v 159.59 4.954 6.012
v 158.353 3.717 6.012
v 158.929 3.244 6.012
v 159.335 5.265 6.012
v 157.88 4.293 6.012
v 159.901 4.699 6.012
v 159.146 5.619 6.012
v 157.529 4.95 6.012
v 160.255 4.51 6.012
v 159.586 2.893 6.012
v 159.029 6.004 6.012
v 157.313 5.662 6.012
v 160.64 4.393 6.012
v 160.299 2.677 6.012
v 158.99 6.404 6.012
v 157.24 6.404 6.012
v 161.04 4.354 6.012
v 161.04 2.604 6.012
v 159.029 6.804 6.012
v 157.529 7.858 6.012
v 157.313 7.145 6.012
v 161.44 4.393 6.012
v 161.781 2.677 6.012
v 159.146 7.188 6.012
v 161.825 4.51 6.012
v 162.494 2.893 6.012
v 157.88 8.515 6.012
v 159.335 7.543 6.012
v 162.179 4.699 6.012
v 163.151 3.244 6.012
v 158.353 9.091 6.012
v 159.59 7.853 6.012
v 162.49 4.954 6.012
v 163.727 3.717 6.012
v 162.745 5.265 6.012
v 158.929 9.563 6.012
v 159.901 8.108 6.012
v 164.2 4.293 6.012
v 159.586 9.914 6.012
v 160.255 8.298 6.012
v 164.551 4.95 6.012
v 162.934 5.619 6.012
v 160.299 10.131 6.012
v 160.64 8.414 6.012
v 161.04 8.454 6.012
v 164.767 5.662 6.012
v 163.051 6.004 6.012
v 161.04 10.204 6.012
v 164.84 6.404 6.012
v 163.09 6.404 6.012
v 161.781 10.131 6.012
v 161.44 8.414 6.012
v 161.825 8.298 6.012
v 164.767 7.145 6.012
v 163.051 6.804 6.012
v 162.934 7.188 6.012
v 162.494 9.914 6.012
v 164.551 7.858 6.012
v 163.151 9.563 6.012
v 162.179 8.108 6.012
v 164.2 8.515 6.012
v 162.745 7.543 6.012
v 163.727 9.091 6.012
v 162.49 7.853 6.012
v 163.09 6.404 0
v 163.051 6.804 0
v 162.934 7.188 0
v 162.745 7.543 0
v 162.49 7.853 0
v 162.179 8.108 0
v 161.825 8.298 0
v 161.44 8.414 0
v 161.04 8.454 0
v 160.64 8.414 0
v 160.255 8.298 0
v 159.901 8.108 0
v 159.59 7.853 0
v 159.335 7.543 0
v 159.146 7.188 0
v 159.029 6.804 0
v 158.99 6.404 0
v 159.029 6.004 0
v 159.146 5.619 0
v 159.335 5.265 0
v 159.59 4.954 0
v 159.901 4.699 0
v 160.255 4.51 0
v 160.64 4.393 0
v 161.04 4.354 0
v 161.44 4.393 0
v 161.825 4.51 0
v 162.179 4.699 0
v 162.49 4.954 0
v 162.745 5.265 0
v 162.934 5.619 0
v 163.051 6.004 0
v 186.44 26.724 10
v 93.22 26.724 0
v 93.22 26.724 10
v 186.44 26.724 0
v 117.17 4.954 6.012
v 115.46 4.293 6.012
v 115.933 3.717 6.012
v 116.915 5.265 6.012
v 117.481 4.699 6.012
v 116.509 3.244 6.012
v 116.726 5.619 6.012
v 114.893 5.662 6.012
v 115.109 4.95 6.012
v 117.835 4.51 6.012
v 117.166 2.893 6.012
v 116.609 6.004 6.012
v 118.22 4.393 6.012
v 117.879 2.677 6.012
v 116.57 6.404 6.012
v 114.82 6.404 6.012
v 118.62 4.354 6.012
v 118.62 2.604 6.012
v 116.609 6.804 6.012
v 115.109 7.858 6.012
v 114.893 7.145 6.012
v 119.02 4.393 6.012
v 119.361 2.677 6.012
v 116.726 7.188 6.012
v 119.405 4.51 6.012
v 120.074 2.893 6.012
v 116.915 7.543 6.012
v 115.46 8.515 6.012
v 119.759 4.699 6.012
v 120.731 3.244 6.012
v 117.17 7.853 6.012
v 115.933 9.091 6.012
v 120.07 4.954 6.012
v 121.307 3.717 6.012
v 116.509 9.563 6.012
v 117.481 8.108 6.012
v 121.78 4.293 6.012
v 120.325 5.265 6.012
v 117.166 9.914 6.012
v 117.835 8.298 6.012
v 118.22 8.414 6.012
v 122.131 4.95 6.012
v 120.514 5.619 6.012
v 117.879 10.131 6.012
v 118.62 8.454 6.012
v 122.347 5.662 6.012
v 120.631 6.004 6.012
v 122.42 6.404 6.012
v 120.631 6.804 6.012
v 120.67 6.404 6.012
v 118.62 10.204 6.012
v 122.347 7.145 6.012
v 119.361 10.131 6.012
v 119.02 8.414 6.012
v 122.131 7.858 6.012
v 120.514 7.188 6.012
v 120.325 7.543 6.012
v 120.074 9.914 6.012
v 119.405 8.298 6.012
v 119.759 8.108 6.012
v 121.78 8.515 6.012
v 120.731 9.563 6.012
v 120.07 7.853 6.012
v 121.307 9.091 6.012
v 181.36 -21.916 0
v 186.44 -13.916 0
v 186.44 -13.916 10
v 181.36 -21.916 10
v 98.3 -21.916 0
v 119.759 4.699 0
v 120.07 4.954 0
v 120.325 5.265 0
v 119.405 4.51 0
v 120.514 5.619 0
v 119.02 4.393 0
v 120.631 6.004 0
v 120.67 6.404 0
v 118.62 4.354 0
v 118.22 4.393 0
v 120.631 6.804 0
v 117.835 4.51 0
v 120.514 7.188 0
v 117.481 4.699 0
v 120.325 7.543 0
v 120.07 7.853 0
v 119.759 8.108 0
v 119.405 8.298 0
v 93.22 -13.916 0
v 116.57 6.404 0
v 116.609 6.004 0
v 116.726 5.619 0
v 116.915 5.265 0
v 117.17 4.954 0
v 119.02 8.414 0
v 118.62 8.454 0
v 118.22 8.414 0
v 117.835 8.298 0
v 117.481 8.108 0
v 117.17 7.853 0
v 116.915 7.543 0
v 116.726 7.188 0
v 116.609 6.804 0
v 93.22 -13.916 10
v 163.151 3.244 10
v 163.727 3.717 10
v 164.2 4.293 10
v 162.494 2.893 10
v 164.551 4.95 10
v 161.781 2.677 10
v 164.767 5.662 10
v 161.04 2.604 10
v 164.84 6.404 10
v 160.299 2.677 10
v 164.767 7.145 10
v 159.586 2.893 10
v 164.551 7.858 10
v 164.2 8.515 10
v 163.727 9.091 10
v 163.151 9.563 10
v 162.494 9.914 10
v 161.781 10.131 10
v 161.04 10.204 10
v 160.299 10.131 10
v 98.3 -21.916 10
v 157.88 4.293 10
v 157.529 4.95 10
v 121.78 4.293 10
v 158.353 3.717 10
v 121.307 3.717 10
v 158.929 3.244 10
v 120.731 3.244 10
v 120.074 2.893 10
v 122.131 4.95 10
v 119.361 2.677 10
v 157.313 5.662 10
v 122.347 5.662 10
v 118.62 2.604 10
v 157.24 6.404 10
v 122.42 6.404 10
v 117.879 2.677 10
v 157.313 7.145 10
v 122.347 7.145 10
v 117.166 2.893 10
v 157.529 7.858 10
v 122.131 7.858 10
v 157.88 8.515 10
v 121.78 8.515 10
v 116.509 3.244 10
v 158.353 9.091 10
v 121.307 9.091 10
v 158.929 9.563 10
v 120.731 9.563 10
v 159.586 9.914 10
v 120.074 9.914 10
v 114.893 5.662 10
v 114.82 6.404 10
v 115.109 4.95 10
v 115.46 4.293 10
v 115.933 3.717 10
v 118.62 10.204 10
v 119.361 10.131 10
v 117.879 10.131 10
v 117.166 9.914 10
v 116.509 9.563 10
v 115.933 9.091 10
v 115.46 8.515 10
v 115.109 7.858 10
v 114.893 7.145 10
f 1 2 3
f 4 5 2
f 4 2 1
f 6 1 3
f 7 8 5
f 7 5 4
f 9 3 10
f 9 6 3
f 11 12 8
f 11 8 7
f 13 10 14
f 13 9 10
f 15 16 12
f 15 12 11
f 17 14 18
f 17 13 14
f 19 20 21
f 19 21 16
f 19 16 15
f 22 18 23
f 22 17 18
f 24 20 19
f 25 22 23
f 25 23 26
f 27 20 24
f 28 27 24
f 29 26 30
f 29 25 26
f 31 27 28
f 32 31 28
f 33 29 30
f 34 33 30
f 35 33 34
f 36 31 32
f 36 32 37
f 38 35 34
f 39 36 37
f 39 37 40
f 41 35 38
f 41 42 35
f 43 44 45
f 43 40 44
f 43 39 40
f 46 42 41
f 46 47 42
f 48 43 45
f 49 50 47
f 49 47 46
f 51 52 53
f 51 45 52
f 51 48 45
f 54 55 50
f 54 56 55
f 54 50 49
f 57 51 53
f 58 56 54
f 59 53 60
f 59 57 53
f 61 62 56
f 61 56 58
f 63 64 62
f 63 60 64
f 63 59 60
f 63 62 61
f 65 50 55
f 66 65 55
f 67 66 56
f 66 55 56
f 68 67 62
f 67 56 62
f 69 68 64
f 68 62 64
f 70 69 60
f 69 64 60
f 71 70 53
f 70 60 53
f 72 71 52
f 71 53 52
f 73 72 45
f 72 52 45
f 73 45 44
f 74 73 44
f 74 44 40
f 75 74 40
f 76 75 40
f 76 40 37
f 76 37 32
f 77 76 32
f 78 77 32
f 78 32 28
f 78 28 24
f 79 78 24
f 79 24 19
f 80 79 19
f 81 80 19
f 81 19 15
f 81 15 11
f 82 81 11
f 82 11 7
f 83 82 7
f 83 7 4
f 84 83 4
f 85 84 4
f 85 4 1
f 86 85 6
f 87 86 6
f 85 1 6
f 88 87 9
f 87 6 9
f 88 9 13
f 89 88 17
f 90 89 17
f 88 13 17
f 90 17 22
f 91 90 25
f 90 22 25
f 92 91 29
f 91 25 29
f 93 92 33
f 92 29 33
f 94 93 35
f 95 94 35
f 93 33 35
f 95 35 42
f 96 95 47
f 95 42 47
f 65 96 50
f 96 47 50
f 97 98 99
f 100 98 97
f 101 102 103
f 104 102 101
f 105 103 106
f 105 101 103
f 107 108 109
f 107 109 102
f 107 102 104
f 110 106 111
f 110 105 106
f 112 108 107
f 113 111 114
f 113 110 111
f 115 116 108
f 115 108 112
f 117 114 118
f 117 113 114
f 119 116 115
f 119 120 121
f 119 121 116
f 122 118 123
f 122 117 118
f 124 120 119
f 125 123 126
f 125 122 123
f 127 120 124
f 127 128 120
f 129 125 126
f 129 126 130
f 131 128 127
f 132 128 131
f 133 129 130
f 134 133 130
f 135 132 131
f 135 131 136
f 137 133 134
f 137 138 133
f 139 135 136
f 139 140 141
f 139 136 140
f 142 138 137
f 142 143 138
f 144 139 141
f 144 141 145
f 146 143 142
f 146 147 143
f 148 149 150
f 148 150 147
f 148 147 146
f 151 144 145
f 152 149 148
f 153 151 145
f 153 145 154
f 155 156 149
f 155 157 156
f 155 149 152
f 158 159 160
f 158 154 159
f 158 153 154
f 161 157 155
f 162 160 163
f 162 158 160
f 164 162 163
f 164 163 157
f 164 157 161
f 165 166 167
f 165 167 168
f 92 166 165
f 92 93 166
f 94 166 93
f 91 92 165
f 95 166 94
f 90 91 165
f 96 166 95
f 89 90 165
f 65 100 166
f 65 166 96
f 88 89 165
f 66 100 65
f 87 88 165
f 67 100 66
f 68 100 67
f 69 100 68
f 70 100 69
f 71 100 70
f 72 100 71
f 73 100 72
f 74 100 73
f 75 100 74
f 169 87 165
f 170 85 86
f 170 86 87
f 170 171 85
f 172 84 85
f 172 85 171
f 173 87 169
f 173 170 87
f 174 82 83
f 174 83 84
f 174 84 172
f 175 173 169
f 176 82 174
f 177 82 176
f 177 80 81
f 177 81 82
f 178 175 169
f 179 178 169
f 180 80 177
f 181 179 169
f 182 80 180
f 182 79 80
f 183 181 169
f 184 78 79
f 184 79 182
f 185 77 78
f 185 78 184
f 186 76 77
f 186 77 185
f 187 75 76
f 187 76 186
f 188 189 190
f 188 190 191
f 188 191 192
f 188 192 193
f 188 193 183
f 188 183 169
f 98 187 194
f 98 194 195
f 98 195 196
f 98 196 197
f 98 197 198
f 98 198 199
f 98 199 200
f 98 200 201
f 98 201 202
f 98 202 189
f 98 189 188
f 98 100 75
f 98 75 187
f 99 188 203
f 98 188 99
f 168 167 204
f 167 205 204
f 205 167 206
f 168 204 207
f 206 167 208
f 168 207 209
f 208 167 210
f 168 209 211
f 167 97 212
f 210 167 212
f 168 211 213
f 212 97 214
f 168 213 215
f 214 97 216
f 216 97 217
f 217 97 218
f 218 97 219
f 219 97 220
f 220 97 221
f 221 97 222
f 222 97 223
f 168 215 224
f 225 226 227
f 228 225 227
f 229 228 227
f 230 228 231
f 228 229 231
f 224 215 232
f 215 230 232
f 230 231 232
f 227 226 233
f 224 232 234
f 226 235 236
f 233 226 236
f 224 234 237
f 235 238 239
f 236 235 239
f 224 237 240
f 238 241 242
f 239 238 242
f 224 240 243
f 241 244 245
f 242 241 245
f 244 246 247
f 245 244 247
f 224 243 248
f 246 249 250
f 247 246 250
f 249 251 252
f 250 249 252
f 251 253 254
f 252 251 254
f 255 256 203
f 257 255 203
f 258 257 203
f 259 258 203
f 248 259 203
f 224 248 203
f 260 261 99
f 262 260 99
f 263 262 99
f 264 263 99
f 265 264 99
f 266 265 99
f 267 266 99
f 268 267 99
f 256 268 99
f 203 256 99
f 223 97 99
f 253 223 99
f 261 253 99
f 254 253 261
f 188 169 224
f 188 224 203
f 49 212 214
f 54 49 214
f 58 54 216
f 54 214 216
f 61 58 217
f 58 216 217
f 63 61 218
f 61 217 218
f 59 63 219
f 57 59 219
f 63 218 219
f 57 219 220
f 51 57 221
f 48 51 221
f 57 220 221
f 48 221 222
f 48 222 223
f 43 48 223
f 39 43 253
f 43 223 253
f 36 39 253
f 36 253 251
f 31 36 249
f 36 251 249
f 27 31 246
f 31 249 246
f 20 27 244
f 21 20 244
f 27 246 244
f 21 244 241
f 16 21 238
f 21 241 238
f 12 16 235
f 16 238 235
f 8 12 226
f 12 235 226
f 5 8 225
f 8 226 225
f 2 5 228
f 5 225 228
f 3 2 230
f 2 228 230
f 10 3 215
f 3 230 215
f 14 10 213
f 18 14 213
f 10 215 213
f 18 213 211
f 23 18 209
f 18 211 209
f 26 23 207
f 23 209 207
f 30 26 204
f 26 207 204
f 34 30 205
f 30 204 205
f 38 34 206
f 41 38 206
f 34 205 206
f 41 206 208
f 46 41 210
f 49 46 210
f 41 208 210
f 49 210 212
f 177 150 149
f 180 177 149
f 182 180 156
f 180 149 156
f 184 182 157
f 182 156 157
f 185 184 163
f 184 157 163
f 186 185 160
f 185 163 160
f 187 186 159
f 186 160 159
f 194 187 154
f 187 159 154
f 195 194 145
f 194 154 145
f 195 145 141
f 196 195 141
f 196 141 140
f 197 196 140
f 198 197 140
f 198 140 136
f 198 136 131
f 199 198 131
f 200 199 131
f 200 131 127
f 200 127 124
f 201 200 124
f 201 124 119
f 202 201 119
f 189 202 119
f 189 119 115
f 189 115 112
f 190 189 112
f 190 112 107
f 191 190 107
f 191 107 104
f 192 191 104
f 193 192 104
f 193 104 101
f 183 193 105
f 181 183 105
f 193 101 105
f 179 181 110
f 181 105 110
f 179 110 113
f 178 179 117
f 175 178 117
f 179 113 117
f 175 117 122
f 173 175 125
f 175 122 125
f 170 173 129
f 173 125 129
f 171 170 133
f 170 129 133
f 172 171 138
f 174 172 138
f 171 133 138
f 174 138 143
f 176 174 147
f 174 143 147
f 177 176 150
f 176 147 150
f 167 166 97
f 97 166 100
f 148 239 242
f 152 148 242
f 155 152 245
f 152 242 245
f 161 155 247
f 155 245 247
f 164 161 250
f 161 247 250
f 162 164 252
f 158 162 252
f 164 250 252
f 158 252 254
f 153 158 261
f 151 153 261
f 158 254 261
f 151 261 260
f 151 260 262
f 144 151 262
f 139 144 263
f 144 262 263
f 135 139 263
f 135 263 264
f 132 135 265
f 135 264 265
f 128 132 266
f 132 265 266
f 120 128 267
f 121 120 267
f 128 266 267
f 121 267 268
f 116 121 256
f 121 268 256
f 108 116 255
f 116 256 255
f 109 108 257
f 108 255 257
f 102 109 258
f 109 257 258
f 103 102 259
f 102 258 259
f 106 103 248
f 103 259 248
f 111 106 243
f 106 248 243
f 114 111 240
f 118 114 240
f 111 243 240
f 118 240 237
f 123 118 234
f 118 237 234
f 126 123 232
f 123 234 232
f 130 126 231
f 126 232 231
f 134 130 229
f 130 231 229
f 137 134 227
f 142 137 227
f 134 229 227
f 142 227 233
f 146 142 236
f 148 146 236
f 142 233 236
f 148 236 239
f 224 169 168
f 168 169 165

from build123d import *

# Parameters (mm, degrees)
SKETCH4_W           = 93.22
SKETCH4_H           = 40.64
BOSS_EXTRUDE1_DEPTH = 10
SKETCH5_R           = 3.8
CUT_EXTRUDE1_DEPTH  = 3.9878
SKETCH6_R           = 2.05
CUT_EXTRUDE2_DEPTH  = 7.7978
SKETCH7_R           = 2.05
CUT_EXTRUDE5_DEPTH  = 7.7978


with BuildPart() as part:
    # Sketch4 → Boss-Extrude1 (new body)
    with BuildSketch(Plane.XY):
        Polygon((186.44, -13.916292355), (181.36, -21.916292355), (139.83, -21.916292355), (98.3, -21.916292355), (93.22, -13.916292355), align=None)
        with Locations((139.83, 6.403707645)):
            Rectangle(SKETCH4_W, SKETCH4_H)
    extrude(amount=BOSS_EXTRUDE1_DEPTH)

    # Sketch5 → Cut-Extrude1 (cut)
    with BuildSketch(Plane.XY.offset(10)):
        with Locations((118.62, 6.403707645)):
            Circle(SKETCH5_R)
        with Locations((161.04, 6.403707645)):
            Circle(SKETCH5_R)
    extrude(amount=-CUT_EXTRUDE1_DEPTH, mode=Mode.SUBTRACT)

    # Sketch6 → Cut-Extrude2 (cut)
    with BuildSketch(Plane.XY.offset(6.0122)):
        with Locations((118.62, 6.403707645)):
            Circle(SKETCH6_R)
    extrude(amount=-CUT_EXTRUDE2_DEPTH, mode=Mode.SUBTRACT)

    # Sketch7 → Cut-Extrude5 (cut)
    with BuildSketch(Plane.XY.offset(6.0122)):
        with Locations((161.04, 6.403707645)):
            Circle(SKETCH7_R)
    extrude(amount=-CUT_EXTRUDE5_DEPTH, mode=Mode.SUBTRACT)


solid = part.part
